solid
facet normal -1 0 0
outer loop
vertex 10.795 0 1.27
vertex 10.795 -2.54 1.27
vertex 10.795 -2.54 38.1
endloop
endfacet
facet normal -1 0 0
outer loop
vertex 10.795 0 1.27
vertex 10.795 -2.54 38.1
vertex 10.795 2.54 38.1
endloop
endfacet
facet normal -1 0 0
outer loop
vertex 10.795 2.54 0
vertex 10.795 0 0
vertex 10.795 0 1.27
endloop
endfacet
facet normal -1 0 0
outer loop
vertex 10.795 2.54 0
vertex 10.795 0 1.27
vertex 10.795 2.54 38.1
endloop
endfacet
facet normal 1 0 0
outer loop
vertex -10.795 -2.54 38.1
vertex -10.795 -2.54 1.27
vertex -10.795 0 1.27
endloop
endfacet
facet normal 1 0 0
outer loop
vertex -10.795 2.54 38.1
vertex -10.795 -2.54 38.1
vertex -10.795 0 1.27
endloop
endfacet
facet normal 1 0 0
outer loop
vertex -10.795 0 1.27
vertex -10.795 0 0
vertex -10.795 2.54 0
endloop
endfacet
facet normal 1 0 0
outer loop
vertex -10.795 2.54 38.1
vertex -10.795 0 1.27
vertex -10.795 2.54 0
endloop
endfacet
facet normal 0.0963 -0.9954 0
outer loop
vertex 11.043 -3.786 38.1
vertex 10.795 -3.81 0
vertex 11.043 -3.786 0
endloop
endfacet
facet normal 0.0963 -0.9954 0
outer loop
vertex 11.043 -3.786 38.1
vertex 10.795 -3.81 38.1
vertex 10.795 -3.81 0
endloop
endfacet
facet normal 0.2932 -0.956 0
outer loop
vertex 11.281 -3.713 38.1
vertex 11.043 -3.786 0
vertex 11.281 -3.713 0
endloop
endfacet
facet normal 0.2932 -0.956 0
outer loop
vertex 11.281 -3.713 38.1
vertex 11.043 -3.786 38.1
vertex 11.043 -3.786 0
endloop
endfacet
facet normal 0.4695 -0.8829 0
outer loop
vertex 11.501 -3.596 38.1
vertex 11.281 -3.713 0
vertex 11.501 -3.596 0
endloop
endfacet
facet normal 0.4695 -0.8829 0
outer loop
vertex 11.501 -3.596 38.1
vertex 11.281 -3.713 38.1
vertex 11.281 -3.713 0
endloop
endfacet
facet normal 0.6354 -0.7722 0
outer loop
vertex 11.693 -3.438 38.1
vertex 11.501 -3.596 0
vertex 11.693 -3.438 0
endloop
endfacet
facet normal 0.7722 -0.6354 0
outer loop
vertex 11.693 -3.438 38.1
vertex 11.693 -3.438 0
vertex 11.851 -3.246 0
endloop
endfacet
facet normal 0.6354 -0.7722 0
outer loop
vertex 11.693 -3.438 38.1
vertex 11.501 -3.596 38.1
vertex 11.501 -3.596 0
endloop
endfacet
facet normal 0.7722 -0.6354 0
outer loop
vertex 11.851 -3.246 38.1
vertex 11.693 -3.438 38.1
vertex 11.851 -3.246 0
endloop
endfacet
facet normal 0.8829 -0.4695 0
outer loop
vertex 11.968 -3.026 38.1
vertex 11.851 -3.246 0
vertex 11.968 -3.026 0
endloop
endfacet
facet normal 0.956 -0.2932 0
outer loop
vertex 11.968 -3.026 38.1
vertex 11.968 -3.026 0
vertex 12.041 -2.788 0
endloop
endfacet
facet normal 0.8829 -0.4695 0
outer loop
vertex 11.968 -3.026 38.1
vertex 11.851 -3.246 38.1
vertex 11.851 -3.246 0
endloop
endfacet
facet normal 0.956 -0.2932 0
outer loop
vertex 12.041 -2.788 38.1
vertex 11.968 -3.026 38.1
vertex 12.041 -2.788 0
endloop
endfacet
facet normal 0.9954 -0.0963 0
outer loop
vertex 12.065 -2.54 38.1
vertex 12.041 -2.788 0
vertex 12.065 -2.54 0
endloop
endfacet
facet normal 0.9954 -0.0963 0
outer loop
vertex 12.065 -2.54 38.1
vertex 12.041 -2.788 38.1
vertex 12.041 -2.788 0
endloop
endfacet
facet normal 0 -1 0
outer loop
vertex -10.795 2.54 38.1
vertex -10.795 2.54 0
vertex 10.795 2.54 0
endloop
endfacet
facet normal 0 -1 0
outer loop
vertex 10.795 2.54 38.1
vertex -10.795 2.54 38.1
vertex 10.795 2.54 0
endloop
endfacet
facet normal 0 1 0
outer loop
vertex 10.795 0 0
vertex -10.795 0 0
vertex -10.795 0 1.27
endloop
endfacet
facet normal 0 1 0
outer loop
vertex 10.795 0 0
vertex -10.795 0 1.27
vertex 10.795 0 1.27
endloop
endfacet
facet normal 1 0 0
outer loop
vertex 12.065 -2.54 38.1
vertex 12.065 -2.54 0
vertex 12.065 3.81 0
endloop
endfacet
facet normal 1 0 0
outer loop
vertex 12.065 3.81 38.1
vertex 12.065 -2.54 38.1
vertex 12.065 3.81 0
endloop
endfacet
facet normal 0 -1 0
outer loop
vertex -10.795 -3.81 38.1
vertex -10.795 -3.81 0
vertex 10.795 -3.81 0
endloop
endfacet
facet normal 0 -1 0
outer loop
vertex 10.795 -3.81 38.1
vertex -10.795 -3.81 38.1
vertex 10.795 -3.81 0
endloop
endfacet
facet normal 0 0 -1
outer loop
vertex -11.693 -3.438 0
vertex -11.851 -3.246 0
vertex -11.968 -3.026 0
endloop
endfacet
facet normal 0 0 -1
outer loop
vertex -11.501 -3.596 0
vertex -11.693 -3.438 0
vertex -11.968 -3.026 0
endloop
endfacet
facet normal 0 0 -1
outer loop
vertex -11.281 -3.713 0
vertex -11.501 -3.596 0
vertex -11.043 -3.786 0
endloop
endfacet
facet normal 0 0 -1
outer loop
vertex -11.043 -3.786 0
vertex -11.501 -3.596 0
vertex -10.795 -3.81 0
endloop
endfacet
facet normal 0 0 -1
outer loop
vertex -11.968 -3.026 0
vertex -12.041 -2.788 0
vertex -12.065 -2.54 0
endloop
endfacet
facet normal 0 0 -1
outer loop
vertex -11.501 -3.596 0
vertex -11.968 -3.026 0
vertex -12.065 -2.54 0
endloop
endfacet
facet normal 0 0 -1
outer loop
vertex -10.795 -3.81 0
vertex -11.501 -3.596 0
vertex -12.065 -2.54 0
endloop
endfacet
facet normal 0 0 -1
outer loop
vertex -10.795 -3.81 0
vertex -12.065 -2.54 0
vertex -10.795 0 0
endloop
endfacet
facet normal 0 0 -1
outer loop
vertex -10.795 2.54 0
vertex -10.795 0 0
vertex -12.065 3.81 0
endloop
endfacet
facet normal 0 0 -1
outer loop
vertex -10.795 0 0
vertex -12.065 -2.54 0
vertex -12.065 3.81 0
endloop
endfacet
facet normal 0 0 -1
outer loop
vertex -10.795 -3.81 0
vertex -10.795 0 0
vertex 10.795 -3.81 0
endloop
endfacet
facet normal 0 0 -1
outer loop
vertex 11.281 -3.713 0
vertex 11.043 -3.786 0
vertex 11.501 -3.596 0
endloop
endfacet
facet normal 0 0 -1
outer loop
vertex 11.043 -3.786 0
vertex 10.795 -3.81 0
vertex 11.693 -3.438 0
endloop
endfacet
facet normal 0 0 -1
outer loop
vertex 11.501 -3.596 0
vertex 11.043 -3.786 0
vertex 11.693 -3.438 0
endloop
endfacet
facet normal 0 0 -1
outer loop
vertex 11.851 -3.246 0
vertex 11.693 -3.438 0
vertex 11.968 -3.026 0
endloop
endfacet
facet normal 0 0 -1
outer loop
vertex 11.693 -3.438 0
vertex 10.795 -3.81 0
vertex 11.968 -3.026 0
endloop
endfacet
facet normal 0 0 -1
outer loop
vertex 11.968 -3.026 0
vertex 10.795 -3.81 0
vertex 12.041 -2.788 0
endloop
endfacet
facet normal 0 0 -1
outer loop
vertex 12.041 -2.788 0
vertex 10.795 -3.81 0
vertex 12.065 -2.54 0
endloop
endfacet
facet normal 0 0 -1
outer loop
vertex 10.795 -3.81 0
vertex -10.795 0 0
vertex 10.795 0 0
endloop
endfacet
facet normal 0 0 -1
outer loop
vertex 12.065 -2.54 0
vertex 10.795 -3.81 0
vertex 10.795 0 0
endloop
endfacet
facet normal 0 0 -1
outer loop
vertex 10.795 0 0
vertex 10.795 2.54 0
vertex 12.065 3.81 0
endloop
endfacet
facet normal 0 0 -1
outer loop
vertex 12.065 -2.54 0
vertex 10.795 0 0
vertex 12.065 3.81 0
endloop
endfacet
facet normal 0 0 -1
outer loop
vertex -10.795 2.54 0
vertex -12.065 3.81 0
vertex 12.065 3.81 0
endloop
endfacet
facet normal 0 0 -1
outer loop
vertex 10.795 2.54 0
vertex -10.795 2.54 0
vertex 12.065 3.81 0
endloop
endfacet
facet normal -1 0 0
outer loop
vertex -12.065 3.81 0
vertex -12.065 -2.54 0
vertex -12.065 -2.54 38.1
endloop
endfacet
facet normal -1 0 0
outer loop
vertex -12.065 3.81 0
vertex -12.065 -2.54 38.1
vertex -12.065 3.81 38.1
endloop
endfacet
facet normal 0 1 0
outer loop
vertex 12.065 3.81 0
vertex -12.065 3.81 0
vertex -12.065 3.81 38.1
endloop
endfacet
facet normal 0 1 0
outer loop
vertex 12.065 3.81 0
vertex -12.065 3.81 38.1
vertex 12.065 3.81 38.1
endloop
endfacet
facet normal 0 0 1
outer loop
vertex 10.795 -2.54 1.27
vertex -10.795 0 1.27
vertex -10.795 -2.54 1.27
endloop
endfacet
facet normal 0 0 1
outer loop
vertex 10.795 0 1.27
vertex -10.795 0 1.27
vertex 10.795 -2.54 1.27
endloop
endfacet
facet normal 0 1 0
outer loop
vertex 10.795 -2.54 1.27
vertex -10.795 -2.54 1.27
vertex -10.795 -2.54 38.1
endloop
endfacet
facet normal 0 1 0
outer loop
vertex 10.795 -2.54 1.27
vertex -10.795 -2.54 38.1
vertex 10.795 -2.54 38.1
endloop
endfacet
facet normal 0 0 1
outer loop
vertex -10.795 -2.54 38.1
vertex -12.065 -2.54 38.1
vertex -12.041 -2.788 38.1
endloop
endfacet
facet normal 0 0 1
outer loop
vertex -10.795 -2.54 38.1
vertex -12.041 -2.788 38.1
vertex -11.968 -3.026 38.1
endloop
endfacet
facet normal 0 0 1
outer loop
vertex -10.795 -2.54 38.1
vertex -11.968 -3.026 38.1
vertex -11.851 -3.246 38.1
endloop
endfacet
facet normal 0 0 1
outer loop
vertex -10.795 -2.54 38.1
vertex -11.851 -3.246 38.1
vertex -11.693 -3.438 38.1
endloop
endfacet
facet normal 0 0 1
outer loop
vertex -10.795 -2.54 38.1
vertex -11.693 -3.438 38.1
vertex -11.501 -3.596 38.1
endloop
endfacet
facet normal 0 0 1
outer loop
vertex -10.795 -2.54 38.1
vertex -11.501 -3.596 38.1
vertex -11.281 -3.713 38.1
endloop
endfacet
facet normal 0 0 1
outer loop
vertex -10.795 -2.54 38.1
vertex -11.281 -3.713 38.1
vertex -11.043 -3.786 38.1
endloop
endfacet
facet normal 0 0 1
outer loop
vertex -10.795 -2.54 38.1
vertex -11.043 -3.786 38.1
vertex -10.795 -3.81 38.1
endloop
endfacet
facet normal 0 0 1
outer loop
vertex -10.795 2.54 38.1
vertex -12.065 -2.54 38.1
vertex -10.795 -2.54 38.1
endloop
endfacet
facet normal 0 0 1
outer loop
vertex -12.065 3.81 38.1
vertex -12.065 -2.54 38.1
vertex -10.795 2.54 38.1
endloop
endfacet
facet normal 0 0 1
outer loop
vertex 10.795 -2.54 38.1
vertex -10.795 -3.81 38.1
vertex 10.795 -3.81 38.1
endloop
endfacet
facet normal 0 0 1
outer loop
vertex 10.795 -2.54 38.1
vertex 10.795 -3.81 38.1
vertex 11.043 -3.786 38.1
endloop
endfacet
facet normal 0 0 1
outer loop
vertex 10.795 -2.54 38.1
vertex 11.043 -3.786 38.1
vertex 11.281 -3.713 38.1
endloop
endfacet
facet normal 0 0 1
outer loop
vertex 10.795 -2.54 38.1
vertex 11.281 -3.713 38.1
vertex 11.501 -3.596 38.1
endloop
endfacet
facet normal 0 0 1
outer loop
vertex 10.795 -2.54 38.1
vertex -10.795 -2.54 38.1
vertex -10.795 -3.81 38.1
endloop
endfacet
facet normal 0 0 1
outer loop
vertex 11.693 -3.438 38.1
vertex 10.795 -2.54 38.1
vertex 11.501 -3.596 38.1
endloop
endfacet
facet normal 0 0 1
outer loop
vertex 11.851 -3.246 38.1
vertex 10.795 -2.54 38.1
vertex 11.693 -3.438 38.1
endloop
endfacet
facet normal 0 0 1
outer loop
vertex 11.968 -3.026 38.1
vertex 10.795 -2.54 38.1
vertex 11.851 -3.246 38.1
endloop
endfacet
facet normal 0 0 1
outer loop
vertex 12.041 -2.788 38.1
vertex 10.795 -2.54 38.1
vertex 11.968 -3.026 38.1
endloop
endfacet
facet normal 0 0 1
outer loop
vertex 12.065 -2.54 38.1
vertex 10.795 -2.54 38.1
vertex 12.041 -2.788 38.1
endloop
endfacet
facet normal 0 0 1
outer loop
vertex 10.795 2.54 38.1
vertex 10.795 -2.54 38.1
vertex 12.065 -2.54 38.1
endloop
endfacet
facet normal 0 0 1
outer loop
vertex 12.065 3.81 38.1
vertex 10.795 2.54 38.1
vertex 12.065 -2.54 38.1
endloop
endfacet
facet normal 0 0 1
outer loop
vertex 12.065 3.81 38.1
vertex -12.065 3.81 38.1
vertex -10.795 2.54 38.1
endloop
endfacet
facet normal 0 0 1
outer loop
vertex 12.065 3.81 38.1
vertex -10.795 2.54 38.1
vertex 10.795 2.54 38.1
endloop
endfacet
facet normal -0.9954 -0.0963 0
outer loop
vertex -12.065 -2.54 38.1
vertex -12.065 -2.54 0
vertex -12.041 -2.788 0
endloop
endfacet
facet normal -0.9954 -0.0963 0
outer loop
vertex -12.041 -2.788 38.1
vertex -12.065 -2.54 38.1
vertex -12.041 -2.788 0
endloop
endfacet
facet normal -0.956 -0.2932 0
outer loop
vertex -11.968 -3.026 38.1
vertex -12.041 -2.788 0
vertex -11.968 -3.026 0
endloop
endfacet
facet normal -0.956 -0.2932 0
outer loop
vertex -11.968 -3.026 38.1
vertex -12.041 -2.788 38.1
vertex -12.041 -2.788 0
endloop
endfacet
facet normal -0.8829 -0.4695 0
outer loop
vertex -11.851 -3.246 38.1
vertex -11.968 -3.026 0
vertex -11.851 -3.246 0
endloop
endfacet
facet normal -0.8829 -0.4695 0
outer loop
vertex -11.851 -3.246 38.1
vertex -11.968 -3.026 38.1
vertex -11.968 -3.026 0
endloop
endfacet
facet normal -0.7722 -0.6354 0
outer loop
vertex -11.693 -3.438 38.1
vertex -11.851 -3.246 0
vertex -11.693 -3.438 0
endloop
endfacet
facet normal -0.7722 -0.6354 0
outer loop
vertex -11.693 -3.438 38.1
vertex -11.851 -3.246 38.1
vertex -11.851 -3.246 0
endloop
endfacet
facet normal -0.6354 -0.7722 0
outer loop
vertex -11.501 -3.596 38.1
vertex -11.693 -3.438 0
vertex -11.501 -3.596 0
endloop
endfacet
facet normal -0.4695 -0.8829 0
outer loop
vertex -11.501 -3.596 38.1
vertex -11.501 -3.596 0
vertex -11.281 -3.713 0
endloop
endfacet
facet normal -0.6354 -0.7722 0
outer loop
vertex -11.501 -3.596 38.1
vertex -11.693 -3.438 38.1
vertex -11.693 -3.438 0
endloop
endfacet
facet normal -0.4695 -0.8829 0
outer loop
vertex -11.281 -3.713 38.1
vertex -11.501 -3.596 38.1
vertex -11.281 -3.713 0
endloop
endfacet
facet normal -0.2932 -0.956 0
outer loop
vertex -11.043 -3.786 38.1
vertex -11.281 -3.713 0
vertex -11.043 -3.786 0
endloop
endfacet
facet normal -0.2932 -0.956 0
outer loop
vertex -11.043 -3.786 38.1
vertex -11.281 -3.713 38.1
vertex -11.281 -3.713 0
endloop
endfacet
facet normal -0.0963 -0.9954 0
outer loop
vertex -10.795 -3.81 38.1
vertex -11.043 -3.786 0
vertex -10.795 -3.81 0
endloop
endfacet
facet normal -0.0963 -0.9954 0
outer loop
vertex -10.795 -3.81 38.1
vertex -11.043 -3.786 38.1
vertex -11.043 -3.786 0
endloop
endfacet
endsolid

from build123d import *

# Parameters (mm, degrees)
F0_W     = 24.13
F0_H     = 7.62
F0_W_2   = 21.59
F0_H_2   = 5.08
F1_DEPTH = 38.1
F2_W     = 22.86
F2_H     = 2.741368
F3_DEPTH = 1.27
F4_R     = 1.27


with BuildPart() as f1:
    # F0 (on Top) → F1 (new body)
    with BuildSketch(Plane.XY):
        Rectangle(F0_W, F0_H)
        Rectangle(F0_W_2, F0_H_2, mode=Mode.SUBTRACT)
    extrude(amount=F1_DEPTH)

    # F2 (on Top) → F3 (join)
    with BuildSketch(Plane.XY):
        with Locations((0.031765, -1.370684)):
            Rectangle(F2_W, F2_H)
    extrude(amount=F3_DEPTH)

    # F4
    f4_edges = [f1.edges().sort_by_distance(p)[0] for p in [
        (-12.065, -3.81, 19.05),
        (12.065, -3.81, 19.05),
    ]]
    fillet(f4_edges, radius=F4_R)


solid = f1.part
